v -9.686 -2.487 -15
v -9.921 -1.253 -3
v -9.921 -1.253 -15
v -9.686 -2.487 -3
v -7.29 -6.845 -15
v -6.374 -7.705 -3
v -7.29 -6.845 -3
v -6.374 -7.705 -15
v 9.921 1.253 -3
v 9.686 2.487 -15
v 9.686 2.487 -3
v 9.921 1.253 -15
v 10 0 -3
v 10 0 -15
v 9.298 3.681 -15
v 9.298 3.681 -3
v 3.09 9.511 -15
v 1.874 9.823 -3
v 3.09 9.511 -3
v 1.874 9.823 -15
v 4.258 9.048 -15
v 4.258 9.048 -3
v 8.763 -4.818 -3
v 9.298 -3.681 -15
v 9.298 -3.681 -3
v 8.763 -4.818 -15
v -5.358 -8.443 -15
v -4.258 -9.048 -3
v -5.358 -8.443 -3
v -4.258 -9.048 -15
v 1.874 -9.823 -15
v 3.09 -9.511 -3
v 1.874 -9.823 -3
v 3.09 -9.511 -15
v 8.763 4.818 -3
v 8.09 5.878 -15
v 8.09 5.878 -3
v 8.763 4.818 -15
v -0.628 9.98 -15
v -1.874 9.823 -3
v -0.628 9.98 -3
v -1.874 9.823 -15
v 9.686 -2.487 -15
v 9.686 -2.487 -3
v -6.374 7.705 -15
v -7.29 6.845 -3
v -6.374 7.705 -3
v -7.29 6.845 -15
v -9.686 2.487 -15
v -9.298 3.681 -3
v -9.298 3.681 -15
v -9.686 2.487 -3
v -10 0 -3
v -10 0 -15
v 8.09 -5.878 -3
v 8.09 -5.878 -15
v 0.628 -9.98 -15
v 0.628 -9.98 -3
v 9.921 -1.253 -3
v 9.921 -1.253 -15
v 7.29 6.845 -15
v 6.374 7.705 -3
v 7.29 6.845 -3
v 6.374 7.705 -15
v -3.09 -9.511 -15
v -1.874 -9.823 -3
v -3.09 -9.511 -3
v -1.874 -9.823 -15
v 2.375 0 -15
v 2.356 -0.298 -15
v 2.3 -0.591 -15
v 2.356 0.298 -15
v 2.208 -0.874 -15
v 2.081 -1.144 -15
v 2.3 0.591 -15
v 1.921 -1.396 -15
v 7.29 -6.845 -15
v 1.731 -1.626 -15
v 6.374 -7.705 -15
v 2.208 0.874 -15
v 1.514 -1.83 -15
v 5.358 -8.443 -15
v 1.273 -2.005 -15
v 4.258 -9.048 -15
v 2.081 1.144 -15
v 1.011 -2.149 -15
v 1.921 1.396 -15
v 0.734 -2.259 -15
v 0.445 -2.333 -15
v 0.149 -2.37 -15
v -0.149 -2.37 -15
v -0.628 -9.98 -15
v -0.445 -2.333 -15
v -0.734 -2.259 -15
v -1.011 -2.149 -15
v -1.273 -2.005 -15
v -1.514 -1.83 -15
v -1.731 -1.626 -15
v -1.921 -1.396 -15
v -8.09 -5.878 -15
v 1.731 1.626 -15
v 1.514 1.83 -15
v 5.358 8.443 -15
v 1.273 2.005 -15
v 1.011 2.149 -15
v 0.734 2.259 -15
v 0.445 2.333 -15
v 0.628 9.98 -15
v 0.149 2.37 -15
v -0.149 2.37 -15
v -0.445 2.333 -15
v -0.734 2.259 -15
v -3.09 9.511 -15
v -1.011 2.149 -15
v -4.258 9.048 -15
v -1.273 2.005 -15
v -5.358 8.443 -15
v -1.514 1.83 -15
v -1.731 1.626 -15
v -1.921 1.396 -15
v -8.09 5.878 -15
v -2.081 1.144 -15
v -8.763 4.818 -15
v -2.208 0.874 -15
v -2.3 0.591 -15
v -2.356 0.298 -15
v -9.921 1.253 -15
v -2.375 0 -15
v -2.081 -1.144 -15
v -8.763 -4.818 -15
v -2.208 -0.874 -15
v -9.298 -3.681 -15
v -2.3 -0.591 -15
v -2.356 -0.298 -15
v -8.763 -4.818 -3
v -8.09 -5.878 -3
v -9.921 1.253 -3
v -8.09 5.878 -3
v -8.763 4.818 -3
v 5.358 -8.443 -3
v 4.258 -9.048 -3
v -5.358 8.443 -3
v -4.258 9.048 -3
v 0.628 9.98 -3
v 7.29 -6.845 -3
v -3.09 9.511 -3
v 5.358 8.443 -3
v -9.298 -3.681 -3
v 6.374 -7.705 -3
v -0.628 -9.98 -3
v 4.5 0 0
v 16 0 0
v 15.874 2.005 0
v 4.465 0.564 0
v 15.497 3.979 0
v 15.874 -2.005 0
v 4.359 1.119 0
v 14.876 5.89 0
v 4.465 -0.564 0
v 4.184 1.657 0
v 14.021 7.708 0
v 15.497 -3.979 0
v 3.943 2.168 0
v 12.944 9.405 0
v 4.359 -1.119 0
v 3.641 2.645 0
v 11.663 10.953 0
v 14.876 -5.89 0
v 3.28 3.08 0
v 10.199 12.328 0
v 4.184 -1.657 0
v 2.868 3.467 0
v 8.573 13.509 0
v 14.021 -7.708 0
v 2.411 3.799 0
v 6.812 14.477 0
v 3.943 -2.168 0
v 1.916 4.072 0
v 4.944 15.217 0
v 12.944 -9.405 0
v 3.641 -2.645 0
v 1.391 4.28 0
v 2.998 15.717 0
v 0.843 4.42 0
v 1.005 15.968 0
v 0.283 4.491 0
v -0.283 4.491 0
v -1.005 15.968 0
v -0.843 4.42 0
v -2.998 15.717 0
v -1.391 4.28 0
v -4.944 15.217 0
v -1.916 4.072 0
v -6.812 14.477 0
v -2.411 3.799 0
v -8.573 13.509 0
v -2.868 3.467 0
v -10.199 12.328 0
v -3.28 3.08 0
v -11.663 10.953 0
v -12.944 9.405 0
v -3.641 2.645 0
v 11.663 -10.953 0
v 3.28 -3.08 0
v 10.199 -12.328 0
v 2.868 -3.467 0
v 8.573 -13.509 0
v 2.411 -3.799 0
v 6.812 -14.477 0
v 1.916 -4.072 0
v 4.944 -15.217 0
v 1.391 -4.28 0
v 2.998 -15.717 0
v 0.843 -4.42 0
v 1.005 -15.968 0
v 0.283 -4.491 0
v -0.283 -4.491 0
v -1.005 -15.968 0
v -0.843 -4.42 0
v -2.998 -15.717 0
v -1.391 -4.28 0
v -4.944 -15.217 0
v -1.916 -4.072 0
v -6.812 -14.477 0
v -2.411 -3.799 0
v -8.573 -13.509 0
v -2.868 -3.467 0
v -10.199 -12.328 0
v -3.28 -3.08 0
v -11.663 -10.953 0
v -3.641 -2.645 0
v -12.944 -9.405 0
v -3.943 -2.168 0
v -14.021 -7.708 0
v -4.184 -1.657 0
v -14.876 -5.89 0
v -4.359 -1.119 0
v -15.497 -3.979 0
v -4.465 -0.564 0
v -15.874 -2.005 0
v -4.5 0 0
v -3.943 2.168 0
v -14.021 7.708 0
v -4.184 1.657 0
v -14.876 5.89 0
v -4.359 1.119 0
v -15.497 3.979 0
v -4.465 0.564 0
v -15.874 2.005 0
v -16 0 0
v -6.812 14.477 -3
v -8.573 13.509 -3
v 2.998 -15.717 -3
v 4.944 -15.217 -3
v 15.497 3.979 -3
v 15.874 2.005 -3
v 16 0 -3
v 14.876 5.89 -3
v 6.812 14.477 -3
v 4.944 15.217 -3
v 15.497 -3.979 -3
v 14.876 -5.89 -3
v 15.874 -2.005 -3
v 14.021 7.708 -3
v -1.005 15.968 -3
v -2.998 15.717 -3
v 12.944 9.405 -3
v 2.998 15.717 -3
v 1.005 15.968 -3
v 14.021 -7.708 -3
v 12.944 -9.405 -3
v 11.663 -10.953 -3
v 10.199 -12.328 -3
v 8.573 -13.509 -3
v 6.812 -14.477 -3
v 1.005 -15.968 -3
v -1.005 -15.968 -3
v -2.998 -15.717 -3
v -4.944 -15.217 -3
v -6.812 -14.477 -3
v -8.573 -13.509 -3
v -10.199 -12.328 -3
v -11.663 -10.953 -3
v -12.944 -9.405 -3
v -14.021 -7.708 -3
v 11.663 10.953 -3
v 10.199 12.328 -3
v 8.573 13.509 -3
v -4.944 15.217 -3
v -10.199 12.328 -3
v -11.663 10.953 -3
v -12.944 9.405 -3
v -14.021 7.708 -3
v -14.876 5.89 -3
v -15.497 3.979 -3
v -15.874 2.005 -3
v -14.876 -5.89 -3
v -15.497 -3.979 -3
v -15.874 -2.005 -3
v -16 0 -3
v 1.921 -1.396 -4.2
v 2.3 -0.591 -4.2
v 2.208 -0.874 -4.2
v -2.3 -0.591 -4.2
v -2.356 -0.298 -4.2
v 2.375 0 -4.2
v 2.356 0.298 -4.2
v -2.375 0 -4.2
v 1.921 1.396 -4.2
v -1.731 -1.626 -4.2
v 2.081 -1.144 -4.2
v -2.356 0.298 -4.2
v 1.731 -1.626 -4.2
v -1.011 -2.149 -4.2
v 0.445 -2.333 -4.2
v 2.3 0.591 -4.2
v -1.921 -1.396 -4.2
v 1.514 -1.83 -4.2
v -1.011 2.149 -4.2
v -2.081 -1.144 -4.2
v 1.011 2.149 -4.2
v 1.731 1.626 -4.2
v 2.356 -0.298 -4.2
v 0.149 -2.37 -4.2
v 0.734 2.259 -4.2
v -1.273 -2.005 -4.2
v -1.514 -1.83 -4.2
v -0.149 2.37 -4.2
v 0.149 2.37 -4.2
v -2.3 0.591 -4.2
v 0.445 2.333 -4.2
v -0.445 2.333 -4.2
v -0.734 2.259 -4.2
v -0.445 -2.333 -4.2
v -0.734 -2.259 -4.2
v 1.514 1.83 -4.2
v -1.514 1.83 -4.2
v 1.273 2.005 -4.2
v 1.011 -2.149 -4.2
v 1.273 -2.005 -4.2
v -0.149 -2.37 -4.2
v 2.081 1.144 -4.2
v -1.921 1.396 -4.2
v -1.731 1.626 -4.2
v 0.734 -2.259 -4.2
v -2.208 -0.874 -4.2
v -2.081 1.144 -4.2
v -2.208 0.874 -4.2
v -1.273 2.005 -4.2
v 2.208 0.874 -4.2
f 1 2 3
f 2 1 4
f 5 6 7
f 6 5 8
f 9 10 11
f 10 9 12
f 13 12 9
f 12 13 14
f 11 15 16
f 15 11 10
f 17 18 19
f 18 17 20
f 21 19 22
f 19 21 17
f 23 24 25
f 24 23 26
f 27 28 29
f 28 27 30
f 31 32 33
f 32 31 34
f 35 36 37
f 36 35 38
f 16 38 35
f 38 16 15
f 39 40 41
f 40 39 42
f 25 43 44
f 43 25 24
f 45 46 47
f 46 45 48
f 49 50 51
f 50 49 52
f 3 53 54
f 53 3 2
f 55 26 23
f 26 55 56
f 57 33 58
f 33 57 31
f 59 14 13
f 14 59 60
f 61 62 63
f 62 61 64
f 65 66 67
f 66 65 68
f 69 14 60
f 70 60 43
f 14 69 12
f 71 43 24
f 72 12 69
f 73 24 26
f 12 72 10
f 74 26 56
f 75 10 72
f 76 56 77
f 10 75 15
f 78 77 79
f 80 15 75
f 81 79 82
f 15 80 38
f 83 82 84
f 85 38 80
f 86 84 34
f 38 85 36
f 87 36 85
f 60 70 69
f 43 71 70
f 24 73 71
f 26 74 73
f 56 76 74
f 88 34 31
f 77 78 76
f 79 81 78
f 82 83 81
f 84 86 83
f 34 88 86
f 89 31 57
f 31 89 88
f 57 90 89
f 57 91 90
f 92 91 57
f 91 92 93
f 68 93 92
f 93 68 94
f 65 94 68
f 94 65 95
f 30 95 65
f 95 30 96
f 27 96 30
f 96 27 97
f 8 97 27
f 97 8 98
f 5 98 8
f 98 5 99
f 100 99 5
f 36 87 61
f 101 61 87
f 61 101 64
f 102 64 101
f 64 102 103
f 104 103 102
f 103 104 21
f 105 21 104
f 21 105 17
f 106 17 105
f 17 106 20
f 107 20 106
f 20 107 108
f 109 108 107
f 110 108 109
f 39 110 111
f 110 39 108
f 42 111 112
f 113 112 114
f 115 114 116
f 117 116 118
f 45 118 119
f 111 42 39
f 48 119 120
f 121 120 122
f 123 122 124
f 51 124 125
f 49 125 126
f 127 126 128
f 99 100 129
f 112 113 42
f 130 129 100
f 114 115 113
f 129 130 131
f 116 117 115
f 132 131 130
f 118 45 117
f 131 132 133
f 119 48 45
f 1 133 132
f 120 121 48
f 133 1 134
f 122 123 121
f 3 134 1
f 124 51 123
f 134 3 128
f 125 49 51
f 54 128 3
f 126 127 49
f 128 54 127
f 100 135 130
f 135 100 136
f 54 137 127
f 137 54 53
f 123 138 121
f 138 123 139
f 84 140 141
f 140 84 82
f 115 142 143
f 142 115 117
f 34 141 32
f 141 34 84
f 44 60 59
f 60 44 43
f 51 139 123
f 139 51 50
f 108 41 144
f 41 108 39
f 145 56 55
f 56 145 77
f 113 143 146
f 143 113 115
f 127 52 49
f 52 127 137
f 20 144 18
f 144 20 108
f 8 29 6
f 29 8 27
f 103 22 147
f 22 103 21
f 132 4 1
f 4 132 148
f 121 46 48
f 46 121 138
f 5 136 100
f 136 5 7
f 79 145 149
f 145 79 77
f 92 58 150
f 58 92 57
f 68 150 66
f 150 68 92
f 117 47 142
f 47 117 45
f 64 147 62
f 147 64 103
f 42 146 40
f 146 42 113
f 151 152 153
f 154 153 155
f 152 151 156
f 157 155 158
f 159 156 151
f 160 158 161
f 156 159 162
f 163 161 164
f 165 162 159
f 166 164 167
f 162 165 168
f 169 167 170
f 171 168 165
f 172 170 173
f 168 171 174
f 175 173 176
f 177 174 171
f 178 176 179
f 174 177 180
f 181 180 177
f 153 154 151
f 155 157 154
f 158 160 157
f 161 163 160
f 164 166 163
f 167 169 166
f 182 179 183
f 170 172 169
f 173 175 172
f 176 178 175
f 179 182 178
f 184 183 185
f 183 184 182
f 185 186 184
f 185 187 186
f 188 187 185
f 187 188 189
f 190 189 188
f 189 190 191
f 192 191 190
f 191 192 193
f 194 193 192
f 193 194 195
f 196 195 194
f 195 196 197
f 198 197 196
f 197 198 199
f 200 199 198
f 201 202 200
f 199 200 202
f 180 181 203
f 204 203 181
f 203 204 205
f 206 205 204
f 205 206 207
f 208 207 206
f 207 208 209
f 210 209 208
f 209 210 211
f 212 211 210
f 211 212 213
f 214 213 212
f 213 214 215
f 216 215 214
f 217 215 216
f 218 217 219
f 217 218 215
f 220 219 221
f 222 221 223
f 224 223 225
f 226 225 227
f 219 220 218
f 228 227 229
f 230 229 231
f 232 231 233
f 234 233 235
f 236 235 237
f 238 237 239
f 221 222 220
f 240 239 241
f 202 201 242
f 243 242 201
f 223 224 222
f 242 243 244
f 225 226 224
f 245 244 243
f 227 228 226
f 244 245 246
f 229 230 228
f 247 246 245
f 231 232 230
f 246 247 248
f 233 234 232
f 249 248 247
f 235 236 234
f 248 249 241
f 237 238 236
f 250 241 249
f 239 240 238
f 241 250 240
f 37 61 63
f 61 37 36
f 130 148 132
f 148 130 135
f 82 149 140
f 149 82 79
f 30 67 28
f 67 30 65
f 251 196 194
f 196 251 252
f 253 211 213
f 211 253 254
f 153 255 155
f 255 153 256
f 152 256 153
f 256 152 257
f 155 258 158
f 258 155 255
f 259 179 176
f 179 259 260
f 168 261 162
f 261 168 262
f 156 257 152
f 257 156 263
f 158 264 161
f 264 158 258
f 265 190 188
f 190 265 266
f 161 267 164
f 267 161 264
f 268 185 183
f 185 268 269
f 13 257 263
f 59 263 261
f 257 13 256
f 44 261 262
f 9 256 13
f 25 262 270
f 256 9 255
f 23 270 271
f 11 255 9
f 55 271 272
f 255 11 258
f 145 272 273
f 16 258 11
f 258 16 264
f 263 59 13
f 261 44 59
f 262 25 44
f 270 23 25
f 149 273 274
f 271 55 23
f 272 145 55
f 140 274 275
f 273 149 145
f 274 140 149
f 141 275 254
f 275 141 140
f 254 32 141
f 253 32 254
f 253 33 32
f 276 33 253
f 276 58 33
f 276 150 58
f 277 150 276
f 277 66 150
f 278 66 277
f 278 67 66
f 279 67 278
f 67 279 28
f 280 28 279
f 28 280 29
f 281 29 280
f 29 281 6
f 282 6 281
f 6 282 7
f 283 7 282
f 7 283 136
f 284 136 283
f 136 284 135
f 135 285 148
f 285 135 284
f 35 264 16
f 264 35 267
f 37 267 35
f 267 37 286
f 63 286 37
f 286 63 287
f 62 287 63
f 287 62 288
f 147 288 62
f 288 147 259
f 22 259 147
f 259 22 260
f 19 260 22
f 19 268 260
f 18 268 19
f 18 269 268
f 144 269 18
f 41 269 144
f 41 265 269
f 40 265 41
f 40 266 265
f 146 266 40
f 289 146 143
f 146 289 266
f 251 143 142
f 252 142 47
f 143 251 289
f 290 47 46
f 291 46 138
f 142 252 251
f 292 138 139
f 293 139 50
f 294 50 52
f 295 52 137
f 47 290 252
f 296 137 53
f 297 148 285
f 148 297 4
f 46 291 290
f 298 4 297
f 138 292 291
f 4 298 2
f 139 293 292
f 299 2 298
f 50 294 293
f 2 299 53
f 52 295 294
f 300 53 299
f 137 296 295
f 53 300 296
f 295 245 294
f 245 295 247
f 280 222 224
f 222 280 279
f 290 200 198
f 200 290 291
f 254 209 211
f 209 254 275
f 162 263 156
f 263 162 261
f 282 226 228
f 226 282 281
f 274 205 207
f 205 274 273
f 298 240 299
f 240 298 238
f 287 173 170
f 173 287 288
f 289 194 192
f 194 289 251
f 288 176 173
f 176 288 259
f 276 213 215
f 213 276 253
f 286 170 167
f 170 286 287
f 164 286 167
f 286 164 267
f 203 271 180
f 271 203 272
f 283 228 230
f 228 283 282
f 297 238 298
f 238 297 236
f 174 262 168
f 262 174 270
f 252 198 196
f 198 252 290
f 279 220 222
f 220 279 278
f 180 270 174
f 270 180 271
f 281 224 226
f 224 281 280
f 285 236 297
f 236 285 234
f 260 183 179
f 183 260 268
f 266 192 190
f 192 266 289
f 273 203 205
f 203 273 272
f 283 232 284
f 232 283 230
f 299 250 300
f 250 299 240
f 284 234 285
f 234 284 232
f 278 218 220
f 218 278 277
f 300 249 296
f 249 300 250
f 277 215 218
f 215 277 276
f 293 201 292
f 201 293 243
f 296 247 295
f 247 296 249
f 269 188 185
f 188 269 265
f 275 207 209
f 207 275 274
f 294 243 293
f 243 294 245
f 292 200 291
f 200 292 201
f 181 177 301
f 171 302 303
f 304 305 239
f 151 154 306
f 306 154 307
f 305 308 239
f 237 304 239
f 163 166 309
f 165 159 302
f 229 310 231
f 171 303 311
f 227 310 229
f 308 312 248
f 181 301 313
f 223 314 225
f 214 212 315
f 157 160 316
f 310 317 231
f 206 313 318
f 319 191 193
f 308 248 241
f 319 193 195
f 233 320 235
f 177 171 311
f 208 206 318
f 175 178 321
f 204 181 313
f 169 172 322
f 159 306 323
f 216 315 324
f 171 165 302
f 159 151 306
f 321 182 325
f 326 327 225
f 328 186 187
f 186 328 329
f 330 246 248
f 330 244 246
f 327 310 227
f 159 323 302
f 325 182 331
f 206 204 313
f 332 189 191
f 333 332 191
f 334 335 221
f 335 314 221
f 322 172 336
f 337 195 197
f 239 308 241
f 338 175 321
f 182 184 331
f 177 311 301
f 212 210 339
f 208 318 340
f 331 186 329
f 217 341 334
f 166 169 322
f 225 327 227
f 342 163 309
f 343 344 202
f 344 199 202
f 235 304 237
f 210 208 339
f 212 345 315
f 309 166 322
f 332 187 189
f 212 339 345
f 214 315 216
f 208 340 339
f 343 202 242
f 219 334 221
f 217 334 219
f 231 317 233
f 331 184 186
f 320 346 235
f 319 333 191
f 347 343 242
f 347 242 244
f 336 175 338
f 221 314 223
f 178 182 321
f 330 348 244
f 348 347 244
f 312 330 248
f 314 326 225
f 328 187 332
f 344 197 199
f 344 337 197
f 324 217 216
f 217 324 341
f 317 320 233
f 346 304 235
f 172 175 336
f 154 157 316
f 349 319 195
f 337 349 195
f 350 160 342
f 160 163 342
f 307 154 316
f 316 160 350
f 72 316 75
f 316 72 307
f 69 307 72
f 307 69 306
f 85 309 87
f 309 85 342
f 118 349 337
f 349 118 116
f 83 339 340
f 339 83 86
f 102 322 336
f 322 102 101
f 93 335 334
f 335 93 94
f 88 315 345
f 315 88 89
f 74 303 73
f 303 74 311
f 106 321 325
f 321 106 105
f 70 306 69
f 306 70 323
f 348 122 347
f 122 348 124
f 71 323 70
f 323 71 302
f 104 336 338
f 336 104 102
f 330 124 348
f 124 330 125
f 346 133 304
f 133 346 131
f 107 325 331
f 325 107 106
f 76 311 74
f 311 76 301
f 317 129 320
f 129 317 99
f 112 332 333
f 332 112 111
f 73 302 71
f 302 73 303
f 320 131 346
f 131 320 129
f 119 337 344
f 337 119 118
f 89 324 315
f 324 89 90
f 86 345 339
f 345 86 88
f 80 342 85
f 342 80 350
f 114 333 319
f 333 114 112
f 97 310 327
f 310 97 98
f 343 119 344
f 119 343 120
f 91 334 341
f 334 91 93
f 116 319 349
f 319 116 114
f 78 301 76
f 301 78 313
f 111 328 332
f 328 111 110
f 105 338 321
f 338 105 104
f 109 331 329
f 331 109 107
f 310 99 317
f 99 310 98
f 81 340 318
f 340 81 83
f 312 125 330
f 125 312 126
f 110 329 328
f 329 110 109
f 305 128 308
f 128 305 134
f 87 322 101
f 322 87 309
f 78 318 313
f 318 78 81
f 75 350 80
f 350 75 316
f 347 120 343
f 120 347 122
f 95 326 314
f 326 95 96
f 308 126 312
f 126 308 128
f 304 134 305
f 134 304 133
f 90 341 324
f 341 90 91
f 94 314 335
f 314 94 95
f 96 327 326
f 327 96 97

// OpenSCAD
$fn = 50;


difference() {
	union() {
		translate(v = [0, 0, -15.0000000000]) {
			cylinder(h = 15, r = 10.0000000000);
		}
		translate(v = [0, 0, -3.0000000000]) {
			cylinder(h = 3, r = 16.0000000000);
		}
	}
	union() {
		translate(v = [0, 0, 0]) {
			rotate(a = [0, 0, 0]) {
				difference() {
					union() {
						#translate(v = [0, 0, -15.0000000000]) {
							cylinder(h = 15, r = 2.2500000000);
						}
						#translate(v = [0, 0, -4.2000000000]) {
							cylinder(h = 4.2000000000, r = 10.0000000000, r1 = 2.3750000000, r2 = 4.5000000000);
						}
						#translate(v = [0, 0, -15.0000000000]) {
							cylinder(h = 15, r = 2.3750000000);
						}
						#translate(v = [0, 0, -15.0000000000]) {
							cylinder(h = 15, r = 2.2500000000);
						}
					}
					union();
				}
			}
		}
	}
}
